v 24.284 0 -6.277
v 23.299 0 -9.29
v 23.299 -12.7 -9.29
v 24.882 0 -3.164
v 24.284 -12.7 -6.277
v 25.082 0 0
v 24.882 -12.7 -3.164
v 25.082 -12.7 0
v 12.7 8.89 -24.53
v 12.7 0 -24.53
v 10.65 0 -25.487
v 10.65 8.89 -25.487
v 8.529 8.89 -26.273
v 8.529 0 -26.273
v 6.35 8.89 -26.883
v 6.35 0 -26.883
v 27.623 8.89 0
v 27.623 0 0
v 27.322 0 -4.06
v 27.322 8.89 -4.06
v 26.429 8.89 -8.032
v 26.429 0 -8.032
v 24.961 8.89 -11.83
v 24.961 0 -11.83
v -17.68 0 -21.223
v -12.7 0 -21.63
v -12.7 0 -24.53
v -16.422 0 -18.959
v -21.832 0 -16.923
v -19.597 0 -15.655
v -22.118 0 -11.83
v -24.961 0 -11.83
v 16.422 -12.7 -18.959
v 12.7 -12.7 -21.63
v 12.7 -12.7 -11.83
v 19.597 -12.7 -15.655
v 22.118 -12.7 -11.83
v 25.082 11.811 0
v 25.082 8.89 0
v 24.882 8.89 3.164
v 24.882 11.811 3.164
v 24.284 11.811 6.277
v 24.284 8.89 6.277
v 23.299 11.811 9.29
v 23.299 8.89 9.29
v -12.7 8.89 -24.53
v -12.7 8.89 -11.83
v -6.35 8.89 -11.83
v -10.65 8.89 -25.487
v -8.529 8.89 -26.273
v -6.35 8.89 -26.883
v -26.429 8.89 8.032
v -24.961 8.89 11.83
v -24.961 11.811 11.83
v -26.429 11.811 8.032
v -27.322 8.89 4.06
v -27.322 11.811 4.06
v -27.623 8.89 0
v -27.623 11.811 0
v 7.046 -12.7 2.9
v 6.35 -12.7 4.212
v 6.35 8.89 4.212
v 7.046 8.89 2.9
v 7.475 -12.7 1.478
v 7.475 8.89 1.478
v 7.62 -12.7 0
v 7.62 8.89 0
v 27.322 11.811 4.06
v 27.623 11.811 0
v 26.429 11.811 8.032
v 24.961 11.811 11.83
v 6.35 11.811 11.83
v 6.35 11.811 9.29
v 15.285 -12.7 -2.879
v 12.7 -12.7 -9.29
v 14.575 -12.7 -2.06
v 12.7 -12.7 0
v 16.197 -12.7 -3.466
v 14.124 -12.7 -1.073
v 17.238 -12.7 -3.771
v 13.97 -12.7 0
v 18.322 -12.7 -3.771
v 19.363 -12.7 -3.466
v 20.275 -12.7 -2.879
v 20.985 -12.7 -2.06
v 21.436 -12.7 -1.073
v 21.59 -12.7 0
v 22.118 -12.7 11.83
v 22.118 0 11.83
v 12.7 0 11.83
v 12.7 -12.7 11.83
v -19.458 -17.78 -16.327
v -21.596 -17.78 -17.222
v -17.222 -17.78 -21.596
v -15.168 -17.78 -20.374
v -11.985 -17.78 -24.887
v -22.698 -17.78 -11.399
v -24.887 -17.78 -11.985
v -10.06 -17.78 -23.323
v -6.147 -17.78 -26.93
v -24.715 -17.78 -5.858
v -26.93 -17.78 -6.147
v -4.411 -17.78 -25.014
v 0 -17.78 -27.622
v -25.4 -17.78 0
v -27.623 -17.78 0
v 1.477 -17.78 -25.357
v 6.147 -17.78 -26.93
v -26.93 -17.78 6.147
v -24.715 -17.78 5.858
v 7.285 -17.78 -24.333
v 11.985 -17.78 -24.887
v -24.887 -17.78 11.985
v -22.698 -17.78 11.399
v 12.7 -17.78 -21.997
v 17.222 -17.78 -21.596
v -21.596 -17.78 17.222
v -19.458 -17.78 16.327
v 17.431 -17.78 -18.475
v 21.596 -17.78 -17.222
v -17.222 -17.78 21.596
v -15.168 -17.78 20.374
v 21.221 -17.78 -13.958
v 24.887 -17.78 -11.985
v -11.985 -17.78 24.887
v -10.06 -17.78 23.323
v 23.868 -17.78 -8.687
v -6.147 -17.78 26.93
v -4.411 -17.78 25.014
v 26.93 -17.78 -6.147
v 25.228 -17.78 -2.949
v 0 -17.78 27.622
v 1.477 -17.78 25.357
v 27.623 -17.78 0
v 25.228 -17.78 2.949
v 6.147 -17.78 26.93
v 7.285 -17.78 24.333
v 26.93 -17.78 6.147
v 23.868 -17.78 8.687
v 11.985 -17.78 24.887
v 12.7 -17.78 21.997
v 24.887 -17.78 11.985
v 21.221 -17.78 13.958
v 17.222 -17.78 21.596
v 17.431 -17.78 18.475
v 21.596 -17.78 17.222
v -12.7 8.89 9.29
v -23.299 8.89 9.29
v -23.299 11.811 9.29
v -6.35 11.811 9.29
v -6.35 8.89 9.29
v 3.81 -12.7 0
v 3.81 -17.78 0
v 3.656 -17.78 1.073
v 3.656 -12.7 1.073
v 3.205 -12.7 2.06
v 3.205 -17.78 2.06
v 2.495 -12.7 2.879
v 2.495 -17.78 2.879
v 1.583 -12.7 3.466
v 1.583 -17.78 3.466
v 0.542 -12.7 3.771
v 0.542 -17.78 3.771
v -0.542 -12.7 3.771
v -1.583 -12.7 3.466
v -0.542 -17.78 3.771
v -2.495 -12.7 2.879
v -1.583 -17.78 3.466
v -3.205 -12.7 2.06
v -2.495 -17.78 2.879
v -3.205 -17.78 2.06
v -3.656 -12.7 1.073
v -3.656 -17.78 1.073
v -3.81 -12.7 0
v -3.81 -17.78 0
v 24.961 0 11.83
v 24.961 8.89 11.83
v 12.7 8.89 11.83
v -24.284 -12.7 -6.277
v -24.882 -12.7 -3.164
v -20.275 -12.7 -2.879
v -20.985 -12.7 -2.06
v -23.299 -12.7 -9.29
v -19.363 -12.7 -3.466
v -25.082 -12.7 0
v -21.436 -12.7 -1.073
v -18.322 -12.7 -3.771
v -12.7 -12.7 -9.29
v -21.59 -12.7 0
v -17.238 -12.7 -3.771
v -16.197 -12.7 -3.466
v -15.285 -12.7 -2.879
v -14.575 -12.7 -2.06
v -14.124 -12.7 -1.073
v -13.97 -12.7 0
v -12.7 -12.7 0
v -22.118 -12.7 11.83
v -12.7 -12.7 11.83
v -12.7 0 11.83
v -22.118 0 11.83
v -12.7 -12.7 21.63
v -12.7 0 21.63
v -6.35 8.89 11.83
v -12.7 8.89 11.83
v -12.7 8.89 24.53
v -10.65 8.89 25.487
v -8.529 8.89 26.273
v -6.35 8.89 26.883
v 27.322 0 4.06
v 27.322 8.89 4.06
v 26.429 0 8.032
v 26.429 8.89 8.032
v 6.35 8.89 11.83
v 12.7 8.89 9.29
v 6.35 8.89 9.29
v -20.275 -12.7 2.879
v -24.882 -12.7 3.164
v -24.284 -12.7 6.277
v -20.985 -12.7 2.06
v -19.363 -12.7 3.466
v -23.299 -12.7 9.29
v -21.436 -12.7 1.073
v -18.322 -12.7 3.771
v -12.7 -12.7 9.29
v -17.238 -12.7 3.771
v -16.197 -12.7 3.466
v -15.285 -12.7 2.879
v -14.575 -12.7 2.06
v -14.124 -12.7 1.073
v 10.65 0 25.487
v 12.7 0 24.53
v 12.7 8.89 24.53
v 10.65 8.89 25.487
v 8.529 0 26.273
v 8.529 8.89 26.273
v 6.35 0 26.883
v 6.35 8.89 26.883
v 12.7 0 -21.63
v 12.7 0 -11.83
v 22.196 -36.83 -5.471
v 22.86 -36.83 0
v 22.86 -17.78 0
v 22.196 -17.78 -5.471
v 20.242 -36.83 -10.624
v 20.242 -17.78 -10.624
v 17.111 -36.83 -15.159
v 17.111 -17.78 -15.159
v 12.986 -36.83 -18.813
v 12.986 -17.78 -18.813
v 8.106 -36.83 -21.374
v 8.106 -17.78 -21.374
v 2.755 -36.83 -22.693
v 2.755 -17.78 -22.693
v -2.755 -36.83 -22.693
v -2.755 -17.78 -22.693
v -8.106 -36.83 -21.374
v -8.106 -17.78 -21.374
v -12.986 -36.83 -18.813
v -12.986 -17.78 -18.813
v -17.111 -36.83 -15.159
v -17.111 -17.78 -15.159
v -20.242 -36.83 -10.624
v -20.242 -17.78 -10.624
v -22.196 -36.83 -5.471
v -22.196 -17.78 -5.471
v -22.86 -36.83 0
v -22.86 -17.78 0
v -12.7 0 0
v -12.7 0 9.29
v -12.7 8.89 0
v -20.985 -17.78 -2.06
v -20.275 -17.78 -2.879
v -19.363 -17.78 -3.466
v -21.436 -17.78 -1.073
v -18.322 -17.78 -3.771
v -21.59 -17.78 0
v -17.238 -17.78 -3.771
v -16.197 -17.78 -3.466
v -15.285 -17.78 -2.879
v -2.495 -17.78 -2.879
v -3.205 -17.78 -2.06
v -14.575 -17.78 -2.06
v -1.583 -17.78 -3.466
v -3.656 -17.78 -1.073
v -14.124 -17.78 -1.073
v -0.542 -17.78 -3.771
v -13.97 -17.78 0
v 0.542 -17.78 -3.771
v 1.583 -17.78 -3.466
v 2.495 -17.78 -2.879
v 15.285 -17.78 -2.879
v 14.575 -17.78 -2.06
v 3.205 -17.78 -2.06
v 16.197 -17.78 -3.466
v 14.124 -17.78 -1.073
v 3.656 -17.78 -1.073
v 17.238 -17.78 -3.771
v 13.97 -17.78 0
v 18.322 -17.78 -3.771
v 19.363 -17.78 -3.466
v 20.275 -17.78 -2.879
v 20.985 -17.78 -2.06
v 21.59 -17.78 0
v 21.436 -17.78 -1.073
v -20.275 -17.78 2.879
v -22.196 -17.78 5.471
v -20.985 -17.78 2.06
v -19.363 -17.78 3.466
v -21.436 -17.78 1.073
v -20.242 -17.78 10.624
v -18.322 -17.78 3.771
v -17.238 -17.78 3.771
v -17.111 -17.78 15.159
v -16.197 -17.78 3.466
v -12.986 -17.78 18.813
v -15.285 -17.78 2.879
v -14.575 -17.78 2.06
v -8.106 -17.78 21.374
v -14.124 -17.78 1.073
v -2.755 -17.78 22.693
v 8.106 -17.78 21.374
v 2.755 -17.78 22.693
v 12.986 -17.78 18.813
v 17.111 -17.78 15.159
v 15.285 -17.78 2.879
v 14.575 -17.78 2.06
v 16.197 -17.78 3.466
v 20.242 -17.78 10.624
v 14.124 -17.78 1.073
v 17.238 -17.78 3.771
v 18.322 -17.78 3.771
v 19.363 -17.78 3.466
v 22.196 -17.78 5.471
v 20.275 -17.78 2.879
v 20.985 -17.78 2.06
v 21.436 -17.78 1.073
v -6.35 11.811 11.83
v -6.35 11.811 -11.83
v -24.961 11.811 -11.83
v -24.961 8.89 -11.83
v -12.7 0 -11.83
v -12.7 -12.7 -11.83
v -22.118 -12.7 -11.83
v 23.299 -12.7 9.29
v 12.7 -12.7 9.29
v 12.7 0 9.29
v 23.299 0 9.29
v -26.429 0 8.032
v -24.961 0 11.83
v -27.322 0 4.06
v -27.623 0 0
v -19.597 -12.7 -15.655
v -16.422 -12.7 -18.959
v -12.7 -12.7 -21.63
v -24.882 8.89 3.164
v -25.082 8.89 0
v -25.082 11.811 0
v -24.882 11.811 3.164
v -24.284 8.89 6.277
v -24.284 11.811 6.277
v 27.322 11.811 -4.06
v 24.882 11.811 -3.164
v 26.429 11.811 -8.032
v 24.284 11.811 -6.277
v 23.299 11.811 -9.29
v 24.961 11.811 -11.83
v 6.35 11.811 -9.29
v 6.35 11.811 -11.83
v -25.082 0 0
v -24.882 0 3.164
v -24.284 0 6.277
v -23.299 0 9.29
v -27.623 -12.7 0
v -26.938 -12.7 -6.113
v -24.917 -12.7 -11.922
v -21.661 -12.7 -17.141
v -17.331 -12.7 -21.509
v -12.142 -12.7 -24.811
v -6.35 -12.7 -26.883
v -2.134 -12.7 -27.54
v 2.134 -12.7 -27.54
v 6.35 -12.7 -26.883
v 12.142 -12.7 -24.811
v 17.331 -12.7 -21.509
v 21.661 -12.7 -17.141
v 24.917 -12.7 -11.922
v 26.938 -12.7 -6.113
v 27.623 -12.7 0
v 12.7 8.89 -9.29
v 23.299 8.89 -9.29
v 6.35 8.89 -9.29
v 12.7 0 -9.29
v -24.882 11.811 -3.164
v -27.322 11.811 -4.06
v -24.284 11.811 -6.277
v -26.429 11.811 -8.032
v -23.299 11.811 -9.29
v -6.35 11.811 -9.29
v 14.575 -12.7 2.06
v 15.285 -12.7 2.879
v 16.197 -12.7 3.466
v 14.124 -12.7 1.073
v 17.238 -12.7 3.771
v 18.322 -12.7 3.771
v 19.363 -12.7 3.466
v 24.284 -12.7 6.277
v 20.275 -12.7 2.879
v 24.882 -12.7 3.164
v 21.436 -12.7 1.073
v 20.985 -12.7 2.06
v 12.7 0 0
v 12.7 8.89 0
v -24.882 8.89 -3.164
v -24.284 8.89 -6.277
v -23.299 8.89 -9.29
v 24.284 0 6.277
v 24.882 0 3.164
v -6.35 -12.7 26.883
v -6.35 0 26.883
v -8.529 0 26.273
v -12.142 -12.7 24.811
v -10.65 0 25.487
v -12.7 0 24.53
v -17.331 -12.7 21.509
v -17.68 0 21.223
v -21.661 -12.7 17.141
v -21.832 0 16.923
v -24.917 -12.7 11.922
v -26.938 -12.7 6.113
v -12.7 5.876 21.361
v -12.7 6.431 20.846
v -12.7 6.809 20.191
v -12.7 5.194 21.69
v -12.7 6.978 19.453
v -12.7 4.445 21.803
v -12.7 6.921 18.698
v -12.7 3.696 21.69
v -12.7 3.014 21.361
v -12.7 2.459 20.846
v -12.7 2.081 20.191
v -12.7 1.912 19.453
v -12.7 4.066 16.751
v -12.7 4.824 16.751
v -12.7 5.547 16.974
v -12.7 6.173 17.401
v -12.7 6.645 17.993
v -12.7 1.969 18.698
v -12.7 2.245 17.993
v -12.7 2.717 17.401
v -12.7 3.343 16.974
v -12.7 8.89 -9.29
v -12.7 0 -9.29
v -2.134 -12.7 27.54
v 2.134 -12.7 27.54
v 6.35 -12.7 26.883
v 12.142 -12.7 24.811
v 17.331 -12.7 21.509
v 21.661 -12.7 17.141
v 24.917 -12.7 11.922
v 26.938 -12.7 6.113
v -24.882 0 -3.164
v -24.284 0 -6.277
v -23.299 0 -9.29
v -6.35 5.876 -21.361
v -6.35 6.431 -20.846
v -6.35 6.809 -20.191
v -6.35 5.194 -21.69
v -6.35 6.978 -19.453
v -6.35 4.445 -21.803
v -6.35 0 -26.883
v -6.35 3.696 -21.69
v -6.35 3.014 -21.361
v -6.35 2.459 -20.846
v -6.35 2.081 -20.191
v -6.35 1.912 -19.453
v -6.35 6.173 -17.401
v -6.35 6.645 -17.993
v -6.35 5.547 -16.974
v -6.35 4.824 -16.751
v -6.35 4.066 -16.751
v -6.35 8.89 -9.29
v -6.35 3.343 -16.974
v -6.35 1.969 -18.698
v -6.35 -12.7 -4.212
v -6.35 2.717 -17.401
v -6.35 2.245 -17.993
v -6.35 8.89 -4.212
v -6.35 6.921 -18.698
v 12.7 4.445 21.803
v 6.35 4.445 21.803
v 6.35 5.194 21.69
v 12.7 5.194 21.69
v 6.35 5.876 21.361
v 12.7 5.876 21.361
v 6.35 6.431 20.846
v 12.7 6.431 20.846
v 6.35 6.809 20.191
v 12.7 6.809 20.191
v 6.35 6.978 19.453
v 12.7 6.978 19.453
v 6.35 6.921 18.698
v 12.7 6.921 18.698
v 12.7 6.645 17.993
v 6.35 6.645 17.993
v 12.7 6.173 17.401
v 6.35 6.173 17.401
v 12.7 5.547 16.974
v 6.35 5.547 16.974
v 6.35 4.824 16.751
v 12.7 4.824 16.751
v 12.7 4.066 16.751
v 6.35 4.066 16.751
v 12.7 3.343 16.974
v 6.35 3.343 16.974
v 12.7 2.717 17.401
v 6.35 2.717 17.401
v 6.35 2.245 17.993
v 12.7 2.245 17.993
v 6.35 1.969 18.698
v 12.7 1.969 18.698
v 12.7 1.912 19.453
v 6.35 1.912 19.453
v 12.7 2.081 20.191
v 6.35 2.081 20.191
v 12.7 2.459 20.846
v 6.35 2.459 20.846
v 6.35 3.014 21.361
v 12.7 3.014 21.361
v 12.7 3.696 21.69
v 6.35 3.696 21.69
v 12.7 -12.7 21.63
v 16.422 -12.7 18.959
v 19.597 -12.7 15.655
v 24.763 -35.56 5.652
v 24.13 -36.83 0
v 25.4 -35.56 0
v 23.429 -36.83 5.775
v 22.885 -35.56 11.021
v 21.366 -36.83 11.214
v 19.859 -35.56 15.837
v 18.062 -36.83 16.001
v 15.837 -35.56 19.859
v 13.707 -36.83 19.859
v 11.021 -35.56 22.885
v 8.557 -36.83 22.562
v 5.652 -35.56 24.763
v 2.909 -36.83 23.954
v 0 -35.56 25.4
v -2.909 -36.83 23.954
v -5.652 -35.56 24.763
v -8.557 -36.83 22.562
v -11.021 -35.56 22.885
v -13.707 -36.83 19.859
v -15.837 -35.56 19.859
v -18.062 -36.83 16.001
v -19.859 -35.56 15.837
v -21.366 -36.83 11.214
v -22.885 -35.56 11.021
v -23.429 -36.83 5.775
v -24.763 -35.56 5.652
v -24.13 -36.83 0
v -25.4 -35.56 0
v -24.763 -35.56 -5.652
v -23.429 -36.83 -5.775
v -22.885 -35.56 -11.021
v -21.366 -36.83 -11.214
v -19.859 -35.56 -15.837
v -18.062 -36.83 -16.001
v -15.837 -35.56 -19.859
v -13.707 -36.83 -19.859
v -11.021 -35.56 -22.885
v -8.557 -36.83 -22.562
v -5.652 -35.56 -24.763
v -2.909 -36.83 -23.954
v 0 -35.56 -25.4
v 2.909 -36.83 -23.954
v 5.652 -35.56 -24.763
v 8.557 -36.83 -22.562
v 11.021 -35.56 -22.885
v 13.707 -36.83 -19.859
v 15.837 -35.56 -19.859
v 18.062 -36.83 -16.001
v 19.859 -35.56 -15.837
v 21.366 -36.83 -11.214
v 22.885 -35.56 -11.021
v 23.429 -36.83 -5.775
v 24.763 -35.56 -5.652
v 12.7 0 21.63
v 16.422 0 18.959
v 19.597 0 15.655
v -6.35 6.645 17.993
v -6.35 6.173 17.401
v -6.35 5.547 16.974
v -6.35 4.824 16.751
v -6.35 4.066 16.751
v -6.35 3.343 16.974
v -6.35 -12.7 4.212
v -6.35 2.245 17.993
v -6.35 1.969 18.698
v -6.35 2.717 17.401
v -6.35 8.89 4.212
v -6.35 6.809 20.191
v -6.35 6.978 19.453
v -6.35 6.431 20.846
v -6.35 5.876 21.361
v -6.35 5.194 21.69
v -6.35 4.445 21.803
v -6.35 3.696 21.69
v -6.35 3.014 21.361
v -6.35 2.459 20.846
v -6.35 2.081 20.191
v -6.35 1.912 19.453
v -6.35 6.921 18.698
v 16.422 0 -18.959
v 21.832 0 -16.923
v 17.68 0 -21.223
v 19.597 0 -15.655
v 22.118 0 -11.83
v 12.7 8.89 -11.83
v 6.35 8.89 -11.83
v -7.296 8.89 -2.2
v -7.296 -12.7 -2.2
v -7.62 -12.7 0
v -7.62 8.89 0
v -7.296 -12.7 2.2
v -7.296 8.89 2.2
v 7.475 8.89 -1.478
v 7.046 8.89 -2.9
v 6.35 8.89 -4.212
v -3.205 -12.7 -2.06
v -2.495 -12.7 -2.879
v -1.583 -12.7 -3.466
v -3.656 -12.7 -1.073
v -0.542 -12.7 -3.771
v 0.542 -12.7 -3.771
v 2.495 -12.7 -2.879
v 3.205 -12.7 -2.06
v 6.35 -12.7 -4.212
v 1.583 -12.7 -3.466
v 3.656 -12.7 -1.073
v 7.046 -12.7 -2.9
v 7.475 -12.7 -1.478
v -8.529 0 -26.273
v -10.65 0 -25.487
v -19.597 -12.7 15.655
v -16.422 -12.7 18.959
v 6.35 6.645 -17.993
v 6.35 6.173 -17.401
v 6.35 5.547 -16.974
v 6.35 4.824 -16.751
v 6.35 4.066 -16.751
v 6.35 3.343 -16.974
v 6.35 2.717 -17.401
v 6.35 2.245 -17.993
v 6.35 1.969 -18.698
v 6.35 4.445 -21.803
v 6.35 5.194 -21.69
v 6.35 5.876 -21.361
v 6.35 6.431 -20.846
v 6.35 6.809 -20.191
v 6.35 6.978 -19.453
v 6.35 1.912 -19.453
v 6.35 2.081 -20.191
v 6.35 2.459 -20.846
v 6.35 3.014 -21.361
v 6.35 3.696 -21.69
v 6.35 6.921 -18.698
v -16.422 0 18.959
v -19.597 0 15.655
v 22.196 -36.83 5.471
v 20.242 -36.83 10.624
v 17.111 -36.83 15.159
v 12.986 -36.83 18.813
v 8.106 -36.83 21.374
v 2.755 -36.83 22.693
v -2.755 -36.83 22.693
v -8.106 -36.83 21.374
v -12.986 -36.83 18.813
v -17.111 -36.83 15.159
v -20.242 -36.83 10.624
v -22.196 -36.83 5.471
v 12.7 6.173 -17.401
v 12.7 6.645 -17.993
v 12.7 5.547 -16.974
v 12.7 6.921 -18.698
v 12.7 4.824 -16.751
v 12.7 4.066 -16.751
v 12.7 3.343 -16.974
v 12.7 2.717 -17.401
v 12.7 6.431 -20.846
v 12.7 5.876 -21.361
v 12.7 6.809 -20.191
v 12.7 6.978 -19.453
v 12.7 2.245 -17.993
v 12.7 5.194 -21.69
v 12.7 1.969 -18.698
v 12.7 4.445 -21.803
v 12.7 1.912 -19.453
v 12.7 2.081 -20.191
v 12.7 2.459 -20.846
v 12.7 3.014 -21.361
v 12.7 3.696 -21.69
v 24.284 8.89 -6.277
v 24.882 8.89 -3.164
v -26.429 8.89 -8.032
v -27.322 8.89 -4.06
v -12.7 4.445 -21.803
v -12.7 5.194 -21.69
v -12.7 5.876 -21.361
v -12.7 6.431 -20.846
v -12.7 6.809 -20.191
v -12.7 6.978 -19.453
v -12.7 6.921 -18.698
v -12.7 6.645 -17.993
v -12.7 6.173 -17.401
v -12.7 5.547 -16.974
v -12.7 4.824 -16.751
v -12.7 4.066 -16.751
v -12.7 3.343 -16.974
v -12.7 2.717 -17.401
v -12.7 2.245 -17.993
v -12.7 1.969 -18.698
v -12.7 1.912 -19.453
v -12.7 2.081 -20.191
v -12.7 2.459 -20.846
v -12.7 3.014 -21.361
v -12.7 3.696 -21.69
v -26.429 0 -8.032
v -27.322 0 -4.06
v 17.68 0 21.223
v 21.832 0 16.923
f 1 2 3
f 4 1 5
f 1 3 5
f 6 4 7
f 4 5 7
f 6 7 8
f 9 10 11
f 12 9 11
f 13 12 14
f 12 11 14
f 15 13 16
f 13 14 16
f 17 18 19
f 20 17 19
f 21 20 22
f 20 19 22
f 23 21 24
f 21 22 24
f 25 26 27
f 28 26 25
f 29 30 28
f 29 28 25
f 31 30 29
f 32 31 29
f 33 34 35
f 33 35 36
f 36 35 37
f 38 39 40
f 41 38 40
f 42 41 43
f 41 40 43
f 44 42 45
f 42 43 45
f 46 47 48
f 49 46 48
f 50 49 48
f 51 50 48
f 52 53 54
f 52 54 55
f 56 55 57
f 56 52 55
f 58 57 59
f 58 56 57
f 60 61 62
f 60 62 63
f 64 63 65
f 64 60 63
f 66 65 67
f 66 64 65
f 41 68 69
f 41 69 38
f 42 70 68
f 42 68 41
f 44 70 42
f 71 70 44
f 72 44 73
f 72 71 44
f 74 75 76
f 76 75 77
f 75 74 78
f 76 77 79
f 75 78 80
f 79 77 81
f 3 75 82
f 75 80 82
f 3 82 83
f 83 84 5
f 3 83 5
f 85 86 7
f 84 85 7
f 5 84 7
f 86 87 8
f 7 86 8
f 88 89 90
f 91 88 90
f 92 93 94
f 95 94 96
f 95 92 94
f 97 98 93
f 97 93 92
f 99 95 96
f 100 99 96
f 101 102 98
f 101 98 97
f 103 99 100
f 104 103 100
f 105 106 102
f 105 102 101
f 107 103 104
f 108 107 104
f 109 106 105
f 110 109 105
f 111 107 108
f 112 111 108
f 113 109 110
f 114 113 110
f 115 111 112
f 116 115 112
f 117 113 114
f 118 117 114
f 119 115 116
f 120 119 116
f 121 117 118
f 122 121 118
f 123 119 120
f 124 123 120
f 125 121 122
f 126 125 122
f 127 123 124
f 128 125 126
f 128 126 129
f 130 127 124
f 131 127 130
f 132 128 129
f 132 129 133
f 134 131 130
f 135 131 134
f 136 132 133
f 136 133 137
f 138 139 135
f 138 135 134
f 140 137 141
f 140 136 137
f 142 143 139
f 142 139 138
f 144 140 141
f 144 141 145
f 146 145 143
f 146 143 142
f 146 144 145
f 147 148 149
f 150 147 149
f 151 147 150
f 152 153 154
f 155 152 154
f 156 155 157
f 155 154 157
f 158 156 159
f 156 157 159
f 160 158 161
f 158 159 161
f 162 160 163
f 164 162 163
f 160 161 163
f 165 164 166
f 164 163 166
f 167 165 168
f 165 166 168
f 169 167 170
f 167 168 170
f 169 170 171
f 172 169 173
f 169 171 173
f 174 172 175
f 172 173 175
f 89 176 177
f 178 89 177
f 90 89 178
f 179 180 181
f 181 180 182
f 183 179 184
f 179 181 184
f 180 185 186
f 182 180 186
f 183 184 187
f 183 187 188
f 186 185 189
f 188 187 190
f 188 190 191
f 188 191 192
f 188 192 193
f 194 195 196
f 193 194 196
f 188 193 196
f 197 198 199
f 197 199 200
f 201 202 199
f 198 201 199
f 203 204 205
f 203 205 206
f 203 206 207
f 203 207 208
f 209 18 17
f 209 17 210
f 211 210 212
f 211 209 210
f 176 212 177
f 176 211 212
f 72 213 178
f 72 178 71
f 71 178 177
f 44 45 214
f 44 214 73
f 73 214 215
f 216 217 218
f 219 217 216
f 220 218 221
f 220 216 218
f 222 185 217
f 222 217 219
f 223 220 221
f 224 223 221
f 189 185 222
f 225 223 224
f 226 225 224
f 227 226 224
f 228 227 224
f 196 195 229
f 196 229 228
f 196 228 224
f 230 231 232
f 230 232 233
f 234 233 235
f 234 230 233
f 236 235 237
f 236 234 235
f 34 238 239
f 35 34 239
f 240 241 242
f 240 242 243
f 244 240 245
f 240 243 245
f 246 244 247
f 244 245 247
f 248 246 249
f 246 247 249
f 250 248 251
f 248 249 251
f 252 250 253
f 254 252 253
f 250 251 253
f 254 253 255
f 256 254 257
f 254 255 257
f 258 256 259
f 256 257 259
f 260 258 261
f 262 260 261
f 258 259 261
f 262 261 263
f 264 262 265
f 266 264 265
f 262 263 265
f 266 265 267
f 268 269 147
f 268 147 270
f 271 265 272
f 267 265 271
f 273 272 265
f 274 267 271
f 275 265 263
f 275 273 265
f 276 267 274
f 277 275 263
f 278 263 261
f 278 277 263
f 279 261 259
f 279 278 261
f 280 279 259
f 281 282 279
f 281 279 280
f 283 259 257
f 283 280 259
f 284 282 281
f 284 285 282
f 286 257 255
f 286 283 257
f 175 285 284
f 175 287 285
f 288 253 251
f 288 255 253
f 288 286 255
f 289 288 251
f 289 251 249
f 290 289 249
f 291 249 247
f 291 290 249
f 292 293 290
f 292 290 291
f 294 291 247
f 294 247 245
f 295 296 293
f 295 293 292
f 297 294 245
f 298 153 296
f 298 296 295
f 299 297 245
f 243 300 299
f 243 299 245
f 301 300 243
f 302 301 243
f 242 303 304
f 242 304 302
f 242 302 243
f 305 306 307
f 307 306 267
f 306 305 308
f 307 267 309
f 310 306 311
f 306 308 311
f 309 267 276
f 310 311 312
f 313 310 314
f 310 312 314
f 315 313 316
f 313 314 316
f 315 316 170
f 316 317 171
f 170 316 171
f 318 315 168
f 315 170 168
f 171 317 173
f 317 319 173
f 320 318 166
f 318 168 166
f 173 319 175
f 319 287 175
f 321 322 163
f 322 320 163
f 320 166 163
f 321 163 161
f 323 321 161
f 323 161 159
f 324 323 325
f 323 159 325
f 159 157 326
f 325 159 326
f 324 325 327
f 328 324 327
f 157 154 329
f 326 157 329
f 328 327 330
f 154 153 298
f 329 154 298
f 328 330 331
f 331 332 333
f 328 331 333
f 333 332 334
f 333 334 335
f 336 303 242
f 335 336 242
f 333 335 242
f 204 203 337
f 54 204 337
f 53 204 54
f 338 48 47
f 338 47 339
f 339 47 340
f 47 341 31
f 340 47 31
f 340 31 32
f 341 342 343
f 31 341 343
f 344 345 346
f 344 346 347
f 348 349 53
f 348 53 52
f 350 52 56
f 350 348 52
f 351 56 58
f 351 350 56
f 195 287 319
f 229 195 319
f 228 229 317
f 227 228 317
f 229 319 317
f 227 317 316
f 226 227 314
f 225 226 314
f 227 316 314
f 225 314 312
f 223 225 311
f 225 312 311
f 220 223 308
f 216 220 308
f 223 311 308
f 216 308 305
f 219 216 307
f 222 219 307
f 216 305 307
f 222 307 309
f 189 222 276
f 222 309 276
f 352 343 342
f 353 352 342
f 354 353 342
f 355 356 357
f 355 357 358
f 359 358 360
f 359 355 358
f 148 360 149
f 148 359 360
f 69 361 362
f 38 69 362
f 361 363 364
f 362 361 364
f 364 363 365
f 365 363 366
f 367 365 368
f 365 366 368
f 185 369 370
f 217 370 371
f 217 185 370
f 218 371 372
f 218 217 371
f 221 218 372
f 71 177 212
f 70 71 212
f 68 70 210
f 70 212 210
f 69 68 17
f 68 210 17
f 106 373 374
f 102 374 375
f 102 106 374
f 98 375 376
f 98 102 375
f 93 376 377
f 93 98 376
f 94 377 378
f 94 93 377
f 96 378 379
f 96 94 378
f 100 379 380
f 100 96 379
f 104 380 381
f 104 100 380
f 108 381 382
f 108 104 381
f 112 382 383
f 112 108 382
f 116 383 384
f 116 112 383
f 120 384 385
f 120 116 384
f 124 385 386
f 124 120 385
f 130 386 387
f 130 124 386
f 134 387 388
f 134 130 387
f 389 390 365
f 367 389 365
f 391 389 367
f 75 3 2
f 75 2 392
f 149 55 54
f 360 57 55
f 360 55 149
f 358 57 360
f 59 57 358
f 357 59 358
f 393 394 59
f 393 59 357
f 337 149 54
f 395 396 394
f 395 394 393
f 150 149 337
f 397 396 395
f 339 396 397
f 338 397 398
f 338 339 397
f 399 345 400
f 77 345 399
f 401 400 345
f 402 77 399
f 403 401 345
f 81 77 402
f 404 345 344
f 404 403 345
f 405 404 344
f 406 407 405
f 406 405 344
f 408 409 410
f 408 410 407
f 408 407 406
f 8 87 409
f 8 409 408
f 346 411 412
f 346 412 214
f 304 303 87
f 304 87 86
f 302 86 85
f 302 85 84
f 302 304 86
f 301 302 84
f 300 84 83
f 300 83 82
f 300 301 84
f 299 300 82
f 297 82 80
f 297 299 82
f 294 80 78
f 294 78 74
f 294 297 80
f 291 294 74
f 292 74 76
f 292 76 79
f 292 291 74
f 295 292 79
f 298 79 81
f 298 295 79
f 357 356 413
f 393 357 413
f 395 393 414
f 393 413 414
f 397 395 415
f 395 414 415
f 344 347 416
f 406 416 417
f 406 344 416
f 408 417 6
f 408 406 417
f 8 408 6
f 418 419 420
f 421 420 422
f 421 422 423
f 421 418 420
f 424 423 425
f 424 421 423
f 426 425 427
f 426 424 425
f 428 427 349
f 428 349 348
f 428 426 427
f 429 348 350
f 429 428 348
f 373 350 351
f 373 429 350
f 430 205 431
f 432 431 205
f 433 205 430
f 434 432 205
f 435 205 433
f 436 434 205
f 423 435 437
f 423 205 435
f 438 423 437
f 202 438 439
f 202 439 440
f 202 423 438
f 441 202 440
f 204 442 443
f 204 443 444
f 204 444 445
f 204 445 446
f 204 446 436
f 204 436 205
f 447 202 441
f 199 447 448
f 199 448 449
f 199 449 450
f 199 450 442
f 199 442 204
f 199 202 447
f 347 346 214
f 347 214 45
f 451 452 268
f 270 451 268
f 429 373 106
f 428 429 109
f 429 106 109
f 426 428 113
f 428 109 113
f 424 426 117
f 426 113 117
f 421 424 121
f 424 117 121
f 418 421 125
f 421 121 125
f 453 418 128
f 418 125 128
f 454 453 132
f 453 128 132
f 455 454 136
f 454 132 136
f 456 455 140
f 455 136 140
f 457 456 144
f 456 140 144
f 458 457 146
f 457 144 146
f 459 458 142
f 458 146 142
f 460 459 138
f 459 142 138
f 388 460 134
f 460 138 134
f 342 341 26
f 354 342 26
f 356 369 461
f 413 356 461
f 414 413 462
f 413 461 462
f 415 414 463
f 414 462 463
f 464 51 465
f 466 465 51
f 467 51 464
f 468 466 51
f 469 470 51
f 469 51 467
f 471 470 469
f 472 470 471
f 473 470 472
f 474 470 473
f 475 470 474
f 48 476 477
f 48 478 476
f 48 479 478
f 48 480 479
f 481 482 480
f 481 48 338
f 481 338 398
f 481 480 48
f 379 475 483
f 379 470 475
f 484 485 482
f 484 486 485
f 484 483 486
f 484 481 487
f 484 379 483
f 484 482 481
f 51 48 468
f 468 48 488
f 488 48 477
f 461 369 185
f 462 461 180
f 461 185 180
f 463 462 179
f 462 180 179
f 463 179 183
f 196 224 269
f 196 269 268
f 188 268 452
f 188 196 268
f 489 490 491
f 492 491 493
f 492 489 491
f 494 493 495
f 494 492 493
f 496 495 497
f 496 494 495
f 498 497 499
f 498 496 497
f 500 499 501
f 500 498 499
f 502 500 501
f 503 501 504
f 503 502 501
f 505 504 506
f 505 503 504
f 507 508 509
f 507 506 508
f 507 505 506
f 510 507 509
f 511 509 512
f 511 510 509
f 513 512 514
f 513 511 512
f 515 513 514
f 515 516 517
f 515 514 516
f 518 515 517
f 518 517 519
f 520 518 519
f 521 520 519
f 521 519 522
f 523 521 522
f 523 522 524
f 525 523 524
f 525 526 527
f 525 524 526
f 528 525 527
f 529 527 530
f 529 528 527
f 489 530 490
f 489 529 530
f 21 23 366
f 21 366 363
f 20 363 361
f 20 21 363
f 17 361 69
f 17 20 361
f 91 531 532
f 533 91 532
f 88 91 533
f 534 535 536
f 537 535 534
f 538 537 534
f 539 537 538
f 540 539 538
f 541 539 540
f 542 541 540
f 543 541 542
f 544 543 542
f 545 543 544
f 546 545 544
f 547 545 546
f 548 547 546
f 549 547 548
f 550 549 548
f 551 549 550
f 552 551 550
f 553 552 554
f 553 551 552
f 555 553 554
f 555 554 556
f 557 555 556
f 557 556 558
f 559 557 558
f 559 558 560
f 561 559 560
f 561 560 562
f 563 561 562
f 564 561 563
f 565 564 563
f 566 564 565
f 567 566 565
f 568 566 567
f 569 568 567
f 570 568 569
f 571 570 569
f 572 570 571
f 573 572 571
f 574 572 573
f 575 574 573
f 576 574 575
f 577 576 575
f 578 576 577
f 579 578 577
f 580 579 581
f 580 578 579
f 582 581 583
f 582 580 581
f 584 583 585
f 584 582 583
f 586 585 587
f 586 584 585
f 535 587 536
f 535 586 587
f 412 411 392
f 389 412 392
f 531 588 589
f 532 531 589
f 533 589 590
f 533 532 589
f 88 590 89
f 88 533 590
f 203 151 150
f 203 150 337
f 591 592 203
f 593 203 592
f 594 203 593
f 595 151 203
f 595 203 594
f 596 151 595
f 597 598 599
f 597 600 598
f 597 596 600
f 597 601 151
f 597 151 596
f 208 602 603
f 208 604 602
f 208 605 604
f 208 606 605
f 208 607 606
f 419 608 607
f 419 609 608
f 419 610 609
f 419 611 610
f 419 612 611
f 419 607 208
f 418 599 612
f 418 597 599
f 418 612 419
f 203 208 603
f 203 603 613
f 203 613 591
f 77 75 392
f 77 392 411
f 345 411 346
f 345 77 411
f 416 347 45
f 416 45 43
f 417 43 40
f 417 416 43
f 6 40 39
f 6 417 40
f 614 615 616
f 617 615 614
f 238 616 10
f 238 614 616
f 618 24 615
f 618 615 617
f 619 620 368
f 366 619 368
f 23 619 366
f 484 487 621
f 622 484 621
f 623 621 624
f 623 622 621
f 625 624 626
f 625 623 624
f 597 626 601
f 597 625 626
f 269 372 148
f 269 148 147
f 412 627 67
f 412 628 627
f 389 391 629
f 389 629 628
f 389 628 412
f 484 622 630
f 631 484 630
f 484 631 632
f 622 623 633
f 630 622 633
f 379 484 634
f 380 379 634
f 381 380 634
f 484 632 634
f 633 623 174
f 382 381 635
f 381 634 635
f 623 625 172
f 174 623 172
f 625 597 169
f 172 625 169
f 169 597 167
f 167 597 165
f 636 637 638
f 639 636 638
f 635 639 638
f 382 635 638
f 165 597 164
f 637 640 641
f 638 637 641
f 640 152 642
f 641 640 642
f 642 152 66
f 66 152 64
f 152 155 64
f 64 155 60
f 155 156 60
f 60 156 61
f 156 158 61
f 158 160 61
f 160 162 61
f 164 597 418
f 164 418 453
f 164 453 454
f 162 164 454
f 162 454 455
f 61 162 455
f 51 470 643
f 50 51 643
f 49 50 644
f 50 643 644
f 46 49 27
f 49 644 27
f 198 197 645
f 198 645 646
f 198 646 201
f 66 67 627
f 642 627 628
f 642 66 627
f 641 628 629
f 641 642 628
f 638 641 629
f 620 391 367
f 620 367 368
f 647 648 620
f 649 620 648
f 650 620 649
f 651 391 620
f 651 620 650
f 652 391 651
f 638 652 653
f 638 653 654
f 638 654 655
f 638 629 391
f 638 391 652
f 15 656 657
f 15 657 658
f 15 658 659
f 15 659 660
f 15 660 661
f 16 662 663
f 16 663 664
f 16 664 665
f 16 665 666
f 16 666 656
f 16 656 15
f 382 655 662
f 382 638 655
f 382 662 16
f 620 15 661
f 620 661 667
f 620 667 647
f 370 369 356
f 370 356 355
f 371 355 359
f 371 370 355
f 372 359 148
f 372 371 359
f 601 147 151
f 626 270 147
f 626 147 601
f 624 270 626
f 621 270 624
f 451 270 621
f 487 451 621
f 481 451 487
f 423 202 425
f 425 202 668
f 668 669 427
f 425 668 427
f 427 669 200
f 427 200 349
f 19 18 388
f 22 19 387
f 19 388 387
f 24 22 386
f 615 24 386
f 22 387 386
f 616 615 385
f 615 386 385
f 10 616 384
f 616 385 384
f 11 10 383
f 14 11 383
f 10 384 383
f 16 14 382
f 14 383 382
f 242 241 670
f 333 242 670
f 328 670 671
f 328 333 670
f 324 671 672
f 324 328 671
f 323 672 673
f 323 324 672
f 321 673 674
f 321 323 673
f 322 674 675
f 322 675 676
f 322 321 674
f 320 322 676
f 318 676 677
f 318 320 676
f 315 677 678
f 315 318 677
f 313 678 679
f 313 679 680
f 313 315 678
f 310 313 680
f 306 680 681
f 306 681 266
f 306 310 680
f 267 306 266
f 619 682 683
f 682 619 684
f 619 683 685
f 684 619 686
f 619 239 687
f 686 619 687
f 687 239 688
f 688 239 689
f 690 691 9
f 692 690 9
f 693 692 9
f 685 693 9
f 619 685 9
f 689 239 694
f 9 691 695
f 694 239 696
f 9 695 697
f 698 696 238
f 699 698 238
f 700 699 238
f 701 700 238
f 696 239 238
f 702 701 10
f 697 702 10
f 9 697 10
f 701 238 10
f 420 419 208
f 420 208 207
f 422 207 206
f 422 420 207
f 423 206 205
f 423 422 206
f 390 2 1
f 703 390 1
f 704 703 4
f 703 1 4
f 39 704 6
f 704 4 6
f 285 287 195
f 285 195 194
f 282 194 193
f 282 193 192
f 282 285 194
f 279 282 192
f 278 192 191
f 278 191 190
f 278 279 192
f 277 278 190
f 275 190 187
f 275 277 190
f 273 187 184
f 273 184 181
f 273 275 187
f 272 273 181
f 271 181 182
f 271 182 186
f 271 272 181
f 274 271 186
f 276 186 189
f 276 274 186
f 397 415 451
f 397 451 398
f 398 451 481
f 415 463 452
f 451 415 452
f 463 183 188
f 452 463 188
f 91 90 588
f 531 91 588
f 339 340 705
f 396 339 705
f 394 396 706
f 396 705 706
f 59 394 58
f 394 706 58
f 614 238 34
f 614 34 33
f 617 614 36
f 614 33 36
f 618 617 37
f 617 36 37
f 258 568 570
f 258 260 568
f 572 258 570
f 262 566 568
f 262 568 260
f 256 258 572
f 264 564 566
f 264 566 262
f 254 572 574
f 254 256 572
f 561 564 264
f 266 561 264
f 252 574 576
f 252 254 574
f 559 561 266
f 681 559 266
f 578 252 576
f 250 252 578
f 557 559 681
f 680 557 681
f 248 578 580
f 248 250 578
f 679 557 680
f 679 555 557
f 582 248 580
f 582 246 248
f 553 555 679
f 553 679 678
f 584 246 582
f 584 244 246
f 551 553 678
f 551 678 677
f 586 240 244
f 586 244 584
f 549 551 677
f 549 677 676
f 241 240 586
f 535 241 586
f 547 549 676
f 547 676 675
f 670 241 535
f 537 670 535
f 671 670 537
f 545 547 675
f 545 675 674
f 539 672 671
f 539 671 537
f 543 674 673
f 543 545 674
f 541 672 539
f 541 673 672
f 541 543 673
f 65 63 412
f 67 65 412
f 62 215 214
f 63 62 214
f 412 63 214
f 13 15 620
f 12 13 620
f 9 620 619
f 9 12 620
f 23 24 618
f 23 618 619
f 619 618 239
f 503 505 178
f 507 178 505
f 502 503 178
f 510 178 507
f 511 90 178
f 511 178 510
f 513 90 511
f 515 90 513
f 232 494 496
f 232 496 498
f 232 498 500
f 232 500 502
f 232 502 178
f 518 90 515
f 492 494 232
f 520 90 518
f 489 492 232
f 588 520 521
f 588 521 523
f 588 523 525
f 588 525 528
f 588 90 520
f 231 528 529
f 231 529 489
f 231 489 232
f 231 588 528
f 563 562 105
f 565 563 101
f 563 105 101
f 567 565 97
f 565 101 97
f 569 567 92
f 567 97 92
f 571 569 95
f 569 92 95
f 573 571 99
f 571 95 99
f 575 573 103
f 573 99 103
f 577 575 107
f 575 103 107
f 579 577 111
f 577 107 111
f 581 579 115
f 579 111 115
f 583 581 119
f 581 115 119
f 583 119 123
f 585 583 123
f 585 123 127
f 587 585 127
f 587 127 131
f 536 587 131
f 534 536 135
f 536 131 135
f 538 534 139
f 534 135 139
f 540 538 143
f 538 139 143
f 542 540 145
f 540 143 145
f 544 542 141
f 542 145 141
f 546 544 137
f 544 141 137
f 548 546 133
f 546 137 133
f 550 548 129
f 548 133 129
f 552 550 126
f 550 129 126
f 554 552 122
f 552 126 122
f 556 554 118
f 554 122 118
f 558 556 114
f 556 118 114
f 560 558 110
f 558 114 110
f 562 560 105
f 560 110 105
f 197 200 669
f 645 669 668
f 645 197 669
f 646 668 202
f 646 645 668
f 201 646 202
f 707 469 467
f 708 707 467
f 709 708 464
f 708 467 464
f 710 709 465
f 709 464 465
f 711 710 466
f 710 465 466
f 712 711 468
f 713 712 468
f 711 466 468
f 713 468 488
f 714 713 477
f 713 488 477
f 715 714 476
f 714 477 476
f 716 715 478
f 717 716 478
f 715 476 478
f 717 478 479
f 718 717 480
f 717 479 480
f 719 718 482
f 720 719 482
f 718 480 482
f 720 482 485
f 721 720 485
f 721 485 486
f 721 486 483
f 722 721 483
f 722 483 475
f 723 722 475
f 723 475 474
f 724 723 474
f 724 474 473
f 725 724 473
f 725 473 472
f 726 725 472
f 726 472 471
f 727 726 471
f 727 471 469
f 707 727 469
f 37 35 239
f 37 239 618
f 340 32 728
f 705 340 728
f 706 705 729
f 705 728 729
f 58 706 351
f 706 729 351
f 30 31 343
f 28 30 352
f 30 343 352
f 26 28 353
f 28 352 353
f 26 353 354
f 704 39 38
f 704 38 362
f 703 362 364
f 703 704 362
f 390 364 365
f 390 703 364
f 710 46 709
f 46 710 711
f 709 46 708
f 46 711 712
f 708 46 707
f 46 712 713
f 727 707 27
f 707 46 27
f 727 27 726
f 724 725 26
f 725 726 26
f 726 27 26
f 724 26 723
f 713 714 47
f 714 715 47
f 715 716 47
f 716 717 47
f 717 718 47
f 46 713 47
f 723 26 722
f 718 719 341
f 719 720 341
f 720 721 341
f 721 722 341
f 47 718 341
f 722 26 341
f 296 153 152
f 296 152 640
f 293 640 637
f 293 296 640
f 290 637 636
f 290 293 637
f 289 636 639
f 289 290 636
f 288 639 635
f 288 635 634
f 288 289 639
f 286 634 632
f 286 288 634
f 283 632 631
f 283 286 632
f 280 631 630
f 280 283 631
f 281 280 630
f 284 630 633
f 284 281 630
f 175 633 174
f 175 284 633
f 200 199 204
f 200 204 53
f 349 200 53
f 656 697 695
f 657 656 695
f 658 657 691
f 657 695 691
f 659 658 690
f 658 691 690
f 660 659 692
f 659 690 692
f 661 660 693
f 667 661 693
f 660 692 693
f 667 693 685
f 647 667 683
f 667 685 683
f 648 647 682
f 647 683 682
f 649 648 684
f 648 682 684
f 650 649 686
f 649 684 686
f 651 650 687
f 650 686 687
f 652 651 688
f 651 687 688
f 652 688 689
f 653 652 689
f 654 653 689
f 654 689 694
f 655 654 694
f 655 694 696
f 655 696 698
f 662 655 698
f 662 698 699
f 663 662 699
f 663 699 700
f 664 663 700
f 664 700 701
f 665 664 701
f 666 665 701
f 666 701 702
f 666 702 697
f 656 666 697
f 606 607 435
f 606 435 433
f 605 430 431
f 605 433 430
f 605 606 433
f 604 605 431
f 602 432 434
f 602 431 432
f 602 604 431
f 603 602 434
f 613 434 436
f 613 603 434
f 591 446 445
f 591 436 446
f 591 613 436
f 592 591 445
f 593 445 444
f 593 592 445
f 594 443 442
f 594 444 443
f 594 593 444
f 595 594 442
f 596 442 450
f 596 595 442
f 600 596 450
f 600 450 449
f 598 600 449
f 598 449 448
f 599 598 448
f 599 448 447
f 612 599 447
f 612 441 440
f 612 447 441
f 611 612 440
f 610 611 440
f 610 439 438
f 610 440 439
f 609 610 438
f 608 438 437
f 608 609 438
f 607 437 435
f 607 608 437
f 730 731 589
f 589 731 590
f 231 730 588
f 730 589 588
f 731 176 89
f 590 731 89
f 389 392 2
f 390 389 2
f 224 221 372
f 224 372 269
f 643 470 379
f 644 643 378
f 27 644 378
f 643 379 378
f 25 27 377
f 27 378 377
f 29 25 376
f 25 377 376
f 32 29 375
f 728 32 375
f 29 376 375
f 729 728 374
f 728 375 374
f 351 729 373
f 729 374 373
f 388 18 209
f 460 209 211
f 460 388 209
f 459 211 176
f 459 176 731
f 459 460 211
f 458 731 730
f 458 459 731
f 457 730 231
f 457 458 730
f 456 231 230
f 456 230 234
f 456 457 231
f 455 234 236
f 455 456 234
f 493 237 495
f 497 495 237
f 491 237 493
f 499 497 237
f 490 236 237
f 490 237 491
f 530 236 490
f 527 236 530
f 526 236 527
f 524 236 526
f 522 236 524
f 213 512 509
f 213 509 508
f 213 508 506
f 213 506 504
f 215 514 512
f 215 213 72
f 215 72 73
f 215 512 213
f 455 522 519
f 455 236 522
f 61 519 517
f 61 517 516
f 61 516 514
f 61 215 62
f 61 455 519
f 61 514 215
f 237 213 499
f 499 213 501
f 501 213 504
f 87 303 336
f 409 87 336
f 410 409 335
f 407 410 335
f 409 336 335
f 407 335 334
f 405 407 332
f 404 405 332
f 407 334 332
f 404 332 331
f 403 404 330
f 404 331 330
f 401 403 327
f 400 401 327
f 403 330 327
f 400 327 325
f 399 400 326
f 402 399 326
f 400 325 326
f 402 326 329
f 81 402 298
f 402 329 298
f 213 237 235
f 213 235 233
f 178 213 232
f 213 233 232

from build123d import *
from build123d.topology import SkipClean

# Parameters (mm, degrees)
HINGE_DEPTH           = 8.89
HINGE_2_DEPTH         = 8.89
SKETCH2_R             = 2.54
HINGE_HOLES_DEPTH     = 50.270844447
BODY_START            = 12.7
BODY_DEPTH            = 12.7
BOTTOM_PLATE_START    = 5.08
BOTTOM_PLATE_DEPTH    = 5.08
TUBE_CONNECTION_DEPTH = 19.05
BACKSTOP_DEPTH        = 2.921
CONNECT_TO_BASE_START = 12.7
CONNECT_TO_BASE_DEPTH = 12.7
SKETCH13_R            = 7.62
BOLT_ACCESS_DEPTH     = 21.59
BOTTOM_CHAMFER_SIZE   = 1.27


with BuildPart() as part:
    # Sketch1 → hinge (new body)
    with BuildSketch(Plane(origin=(0, 0, 0), x_dir=(1, 0, 0), z_dir=(0, 1, 0))):
        with BuildLine():
            ThreePointArc((-6.35, 26.882708313), (-9.597376484, 25.901599774), (-12.7, 24.529828908))
            Line((-12.7, 24.529828908), (-12.7, 11.829828908))
            Line((-12.7, 11.829828908), (-24.961122857, 11.829828908))
            ThreePointArc((-24.961122857, 11.829828908), (-26.9489436, 6.062750619), (-27.6225, 0))
            Line((-27.6225, 0), (-25.0825, 0))
            ThreePointArc((-25.0825, 0), (-24.632521559, 4.729766155), (-23.298731406, 9.289828908))
            Line((-23.298731406, 9.289828908), (-12.7, 9.289828908))
            Line((-12.7, 9.289828908), (-12.7, 0))
            Line((-12.7, 0), (-6.35, 0))
            Line((-6.35, 0), (-6.35, 26.882708313))
        make_face()
    hinge = extrude(amount=HINGE_DEPTH)


with BuildPart() as body_2:
    # Sketch1 → hinge 2 (new body)
    with BuildSketch(Plane(origin=(0, 0, 0), x_dir=(1, 0, 0), z_dir=(0, 1, 0))):
        with BuildLine():
            ThreePointArc((12.7, 24.529828908), (9.597376484, 25.901599774), (6.35, 26.882708313))
            Line((6.35, 26.882708313), (6.35, 0))
            Line((6.35, 0), (12.7, 0))
            Line((12.7, 0), (12.7, 9.289828908))
            Line((12.7, 9.289828908), (23.298731406, 9.289828908))
            ThreePointArc((23.298731406, 9.289828908), (24.632521559, 4.729766155), (25.0825, 0))
            Line((25.0825, 0), (27.6225, 0))
            ThreePointArc((27.6225, 0), (26.9489436, 6.062750619), (24.961122857, 11.829828908))
            Line((24.961122857, 11.829828908), (12.7, 11.829828908))
            Line((12.7, 11.829828908), (12.7, 24.529828908))
        make_face()
    hinge_2 = extrude(amount=HINGE_2_DEPTH)


with BuildPart() as hinge_holes_tool:
    # Sketch2 → hinge_holes (new, through all)
    with BuildSketch(Plane(origin=(12.7, 0, 0), x_dir=(0, 0, -1), z_dir=(1, 0, 0))):
        with Locations((19.262708313, 4.445)):
            Circle(SKETCH2_R)
    hinge_holes = extrude(amount=-HINGE_HOLES_DEPTH)


with BuildPart() as part_1:
    add(part.part)

    # hinge_holes: cut by hinge_holes_tool
    add(hinge_holes_tool.part, mode=Mode.SUBTRACT)



with BuildPart() as body_2_1:
    add(body_2.part)

    # hinge_holes: cut by hinge_holes_tool
    add(hinge_holes_tool.part, mode=Mode.SUBTRACT)


with BuildPart() as part_2:
    add(part_1.part)

    add(body_2_1.part)  # body merges body 2
    # Sketch5 → body (add)
    with BuildSketch(Plane.XZ.offset(BODY_START)):
        with BuildLine():
            Line((-27.6225, 0), (-25.0825, 0))
            ThreePointArc((-25.0825, 0), (-19.854542065, -15.327392656), (-6.35, -24.265393181))
            Line((-6.35, -24.265393181), (-6.35, -26.882708313))
            ThreePointArc((-6.35, -26.882708313), (-21.661087014, -17.140589711), (-27.6225, 0))
        make_face()
        with BuildLine():
            Line((25.0825, 0), (27.6225, 0))
            ThreePointArc((27.6225, 0), (21.661087014, -17.140589711), (6.35, -26.882708313))
            Line((6.35, -26.882708313), (6.35, -24.265393181))
            ThreePointArc((6.35, -24.265393181), (19.854542065, -15.327392656), (25.0825, 0))
        make_face()
    body = extrude(amount=-BODY_DEPTH)

    # Sketch6 → bottom_plate (add)
    with SkipClean():  # the faces are left unmerged after this step: merging them gives an invalid solid
        with BuildSketch(Plane.XZ.offset(12.7).offset(BOTTOM_PLATE_START)):
            with BuildLine():
                Line((13.97, 0), (3.81, 0))
                ThreePointArc((3.81, 0), (0, -3.81), (-3.81, 0))
                Line((-3.81, 0), (-13.97, 0))
                ThreePointArc((-13.97, 0), (-17.78, -3.81), (-21.59, 0))
                Line((-21.59, 0), (-27.6225, 0))
                ThreePointArc((-27.6225, 0), (0, -27.6225), (27.6225, 0))
                Line((27.6225, 0), (21.59, 0))
                ThreePointArc((21.59, 0), (17.78, -3.81), (13.97, 0))
            make_face()
        bottom_plate = extrude(amount=-BOTTOM_PLATE_DEPTH)

    # Sketch7 → tube_connection (add)
    with SkipClean():  # the faces are left unmerged after this step: merging them gives an invalid solid
        with BuildSketch(Plane.XZ.offset(17.78)):
            with BuildLine():
                Line((-22.86, 0), (-25.4, 0))
                ThreePointArc((-25.4, 0), (0, -25.4), (25.4, 0))
                Line((25.4, 0), (22.86, 0))
                ThreePointArc((22.86, 0), (0, -22.86), (-22.86, 0))
            make_face()
        tube_connection = extrude(amount=TUBE_CONNECTION_DEPTH)

    # Sketch10 → backstop (add)
    with SkipClean():  # the faces are left unmerged after this step: merging them gives an invalid solid
        with BuildSketch(Plane(origin=(0, 8.89, 0), x_dir=(1, 0, 0), z_dir=(0, 1, 0))):
            with BuildLine():
                Line((-23.298731406, 9.289828908), (-6.35, 9.289828908))
                Line((-6.35, 9.289828908), (-6.35, 11.829828908))
                Line((-6.35, 11.829828908), (-24.961122857, 11.829828908))
                ThreePointArc((-24.961122857, 11.829828908), (-26.9489436, 6.062750619), (-27.6225, 0))
                Line((-27.6225, 0), (-25.0825, 0))
                ThreePointArc((-25.0825, 0), (-24.632521559, 4.729766155), (-23.298731406, 9.289828908))
            make_face()
            with BuildLine():
                Line((6.35, 11.829828908), (24.961122857, 11.829828908))
                ThreePointArc((24.961122857, 11.829828908), (26.9489436, 6.062750619), (27.6225, 0))
                Line((27.6225, 0), (25.0825, 0))
                ThreePointArc((25.0825, 0), (24.632521559, 4.729766155), (23.298731406, 9.289828908))
                Line((23.298731406, 9.289828908), (6.35, 9.289828908))
                Line((6.35, 9.289828908), (6.35, 11.829828908))
            make_face()
        backstop = extrude(amount=BACKSTOP_DEPTH)

    # Mirror1: hinge, hinge 2, hinge_holes, body, bottom_plate, tube_connection, backstop across plane
    with SkipClean():  # the faces are left unmerged after this step: merging them gives an invalid solid
        add(hinge.mirror(Plane(origin=(0, 8.89, 0), x_dir=(1, 0, 0), z_dir=(0, 0, 1))))
        add(hinge_2.mirror(Plane(origin=(0, 8.89, 0), x_dir=(1, 0, 0), z_dir=(0, 0, 1))))
        add(hinge_holes.mirror(Plane(origin=(0, 8.89, 0), x_dir=(1, 0, 0), z_dir=(0, 0, 1))), mode=Mode.SUBTRACT)
        add(body.mirror(Plane(origin=(0, 8.89, 0), x_dir=(1, 0, 0), z_dir=(0, 0, 1))))
        add(bottom_plate.mirror(Plane(origin=(0, 8.89, 0), x_dir=(1, 0, 0), z_dir=(0, 0, 1))))
        add(tube_connection.mirror(Plane(origin=(0, 8.89, 0), x_dir=(1, 0, 0), z_dir=(0, 0, 1))))
        add(backstop.mirror(Plane(origin=(0, 8.89, 0), x_dir=(1, 0, 0), z_dir=(0, 0, 1))))

    # Sketch12 → connect_to_base (add)
    with SkipClean():  # the faces are left unmerged after this step: merging them gives an invalid solid
        with BuildSketch(Plane.XZ.offset(CONNECT_TO_BASE_START)):
            with BuildLine():
                Line((-6.35, -24.265393181), (-6.35, 24.265393181))
                ThreePointArc((-6.35, 24.265393181), (-9.615737574, 23.166126071), (-12.7, 21.629651089))
                Line((-12.7, 21.629651089), (-12.7, 11.829828908))
                Line((-12.7, 11.829828908), (-22.117571165, 11.829828908))
                ThreePointArc((-22.117571165, 11.829828908), (-22.743637238, 10.576330717), (-23.298731406, 9.289828908))
                Line((-23.298731406, 9.289828908), (-12.7, 9.289828908))
                Line((-12.7, 9.289828908), (-12.7, -9.289828908))
                Line((-12.7, -9.289828908), (-23.298731406, -9.289828908))
                ThreePointArc((-23.298731406, -9.289828908), (-22.743637238, -10.576330717), (-22.117571165, -11.829828908))
                Line((-22.117571165, -11.829828908), (-12.7, -11.829828908))
                Line((-12.7, -11.829828908), (-12.7, -21.629651089))
                ThreePointArc((-12.7, -21.629651089), (-9.615737574, -23.166126071), (-6.35, -24.265393181))
            make_face()
            with BuildLine():
                Line((12.7, 9.289828908), (23.298731406, 9.289828908))
                ThreePointArc((23.298731406, 9.289828908), (22.743637238, 10.576330717), (22.117571165, 11.829828908))
                Line((22.117571165, 11.829828908), (12.7, 11.829828908))
                Line((12.7, 11.829828908), (12.7, 21.629651089))
                ThreePointArc((12.7, 21.629651089), (9.615737574, 23.166126071), (6.35, 24.265393181))
                Line((6.35, 24.265393181), (6.35, -24.265393181))
                ThreePointArc((6.35, -24.265393181), (9.615737574, -23.166126071), (12.7, -21.629651089))
                Line((12.7, -21.629651089), (12.7, -11.829828908))
                Line((12.7, -11.829828908), (22.117571165, -11.829828908))
                ThreePointArc((22.117571165, -11.829828908), (22.743637238, -10.576330717), (23.298731406, -9.289828908))
                Line((23.298731406, -9.289828908), (12.7, -9.289828908))
                Line((12.7, -9.289828908), (12.7, 9.289828908))
            make_face()
        extrude(amount=-CONNECT_TO_BASE_DEPTH)
    add(part_2.part.scale(1), mode=Mode.REPLACE)  # the faces are merged on a copy

    # Sketch13 → bolt_access (cut)
    with BuildSketch(Plane(origin=(0, -12.7, 0), x_dir=(1, 0, 0), z_dir=(0, 1, 0))):
        Circle(SKETCH13_R)
    extrude(amount=BOLT_ACCESS_DEPTH, mode=Mode.SUBTRACT)

    # bottom_chamfer
    bottom_chamfer_edges = [part_2.edges().sort_by_distance(p)[0] for p in [
        (0, -36.83, -25.4),
    ]]
    chamfer(bottom_chamfer_edges, length=BOTTOM_CHAMFER_SIZE)


solid = part_2.part
